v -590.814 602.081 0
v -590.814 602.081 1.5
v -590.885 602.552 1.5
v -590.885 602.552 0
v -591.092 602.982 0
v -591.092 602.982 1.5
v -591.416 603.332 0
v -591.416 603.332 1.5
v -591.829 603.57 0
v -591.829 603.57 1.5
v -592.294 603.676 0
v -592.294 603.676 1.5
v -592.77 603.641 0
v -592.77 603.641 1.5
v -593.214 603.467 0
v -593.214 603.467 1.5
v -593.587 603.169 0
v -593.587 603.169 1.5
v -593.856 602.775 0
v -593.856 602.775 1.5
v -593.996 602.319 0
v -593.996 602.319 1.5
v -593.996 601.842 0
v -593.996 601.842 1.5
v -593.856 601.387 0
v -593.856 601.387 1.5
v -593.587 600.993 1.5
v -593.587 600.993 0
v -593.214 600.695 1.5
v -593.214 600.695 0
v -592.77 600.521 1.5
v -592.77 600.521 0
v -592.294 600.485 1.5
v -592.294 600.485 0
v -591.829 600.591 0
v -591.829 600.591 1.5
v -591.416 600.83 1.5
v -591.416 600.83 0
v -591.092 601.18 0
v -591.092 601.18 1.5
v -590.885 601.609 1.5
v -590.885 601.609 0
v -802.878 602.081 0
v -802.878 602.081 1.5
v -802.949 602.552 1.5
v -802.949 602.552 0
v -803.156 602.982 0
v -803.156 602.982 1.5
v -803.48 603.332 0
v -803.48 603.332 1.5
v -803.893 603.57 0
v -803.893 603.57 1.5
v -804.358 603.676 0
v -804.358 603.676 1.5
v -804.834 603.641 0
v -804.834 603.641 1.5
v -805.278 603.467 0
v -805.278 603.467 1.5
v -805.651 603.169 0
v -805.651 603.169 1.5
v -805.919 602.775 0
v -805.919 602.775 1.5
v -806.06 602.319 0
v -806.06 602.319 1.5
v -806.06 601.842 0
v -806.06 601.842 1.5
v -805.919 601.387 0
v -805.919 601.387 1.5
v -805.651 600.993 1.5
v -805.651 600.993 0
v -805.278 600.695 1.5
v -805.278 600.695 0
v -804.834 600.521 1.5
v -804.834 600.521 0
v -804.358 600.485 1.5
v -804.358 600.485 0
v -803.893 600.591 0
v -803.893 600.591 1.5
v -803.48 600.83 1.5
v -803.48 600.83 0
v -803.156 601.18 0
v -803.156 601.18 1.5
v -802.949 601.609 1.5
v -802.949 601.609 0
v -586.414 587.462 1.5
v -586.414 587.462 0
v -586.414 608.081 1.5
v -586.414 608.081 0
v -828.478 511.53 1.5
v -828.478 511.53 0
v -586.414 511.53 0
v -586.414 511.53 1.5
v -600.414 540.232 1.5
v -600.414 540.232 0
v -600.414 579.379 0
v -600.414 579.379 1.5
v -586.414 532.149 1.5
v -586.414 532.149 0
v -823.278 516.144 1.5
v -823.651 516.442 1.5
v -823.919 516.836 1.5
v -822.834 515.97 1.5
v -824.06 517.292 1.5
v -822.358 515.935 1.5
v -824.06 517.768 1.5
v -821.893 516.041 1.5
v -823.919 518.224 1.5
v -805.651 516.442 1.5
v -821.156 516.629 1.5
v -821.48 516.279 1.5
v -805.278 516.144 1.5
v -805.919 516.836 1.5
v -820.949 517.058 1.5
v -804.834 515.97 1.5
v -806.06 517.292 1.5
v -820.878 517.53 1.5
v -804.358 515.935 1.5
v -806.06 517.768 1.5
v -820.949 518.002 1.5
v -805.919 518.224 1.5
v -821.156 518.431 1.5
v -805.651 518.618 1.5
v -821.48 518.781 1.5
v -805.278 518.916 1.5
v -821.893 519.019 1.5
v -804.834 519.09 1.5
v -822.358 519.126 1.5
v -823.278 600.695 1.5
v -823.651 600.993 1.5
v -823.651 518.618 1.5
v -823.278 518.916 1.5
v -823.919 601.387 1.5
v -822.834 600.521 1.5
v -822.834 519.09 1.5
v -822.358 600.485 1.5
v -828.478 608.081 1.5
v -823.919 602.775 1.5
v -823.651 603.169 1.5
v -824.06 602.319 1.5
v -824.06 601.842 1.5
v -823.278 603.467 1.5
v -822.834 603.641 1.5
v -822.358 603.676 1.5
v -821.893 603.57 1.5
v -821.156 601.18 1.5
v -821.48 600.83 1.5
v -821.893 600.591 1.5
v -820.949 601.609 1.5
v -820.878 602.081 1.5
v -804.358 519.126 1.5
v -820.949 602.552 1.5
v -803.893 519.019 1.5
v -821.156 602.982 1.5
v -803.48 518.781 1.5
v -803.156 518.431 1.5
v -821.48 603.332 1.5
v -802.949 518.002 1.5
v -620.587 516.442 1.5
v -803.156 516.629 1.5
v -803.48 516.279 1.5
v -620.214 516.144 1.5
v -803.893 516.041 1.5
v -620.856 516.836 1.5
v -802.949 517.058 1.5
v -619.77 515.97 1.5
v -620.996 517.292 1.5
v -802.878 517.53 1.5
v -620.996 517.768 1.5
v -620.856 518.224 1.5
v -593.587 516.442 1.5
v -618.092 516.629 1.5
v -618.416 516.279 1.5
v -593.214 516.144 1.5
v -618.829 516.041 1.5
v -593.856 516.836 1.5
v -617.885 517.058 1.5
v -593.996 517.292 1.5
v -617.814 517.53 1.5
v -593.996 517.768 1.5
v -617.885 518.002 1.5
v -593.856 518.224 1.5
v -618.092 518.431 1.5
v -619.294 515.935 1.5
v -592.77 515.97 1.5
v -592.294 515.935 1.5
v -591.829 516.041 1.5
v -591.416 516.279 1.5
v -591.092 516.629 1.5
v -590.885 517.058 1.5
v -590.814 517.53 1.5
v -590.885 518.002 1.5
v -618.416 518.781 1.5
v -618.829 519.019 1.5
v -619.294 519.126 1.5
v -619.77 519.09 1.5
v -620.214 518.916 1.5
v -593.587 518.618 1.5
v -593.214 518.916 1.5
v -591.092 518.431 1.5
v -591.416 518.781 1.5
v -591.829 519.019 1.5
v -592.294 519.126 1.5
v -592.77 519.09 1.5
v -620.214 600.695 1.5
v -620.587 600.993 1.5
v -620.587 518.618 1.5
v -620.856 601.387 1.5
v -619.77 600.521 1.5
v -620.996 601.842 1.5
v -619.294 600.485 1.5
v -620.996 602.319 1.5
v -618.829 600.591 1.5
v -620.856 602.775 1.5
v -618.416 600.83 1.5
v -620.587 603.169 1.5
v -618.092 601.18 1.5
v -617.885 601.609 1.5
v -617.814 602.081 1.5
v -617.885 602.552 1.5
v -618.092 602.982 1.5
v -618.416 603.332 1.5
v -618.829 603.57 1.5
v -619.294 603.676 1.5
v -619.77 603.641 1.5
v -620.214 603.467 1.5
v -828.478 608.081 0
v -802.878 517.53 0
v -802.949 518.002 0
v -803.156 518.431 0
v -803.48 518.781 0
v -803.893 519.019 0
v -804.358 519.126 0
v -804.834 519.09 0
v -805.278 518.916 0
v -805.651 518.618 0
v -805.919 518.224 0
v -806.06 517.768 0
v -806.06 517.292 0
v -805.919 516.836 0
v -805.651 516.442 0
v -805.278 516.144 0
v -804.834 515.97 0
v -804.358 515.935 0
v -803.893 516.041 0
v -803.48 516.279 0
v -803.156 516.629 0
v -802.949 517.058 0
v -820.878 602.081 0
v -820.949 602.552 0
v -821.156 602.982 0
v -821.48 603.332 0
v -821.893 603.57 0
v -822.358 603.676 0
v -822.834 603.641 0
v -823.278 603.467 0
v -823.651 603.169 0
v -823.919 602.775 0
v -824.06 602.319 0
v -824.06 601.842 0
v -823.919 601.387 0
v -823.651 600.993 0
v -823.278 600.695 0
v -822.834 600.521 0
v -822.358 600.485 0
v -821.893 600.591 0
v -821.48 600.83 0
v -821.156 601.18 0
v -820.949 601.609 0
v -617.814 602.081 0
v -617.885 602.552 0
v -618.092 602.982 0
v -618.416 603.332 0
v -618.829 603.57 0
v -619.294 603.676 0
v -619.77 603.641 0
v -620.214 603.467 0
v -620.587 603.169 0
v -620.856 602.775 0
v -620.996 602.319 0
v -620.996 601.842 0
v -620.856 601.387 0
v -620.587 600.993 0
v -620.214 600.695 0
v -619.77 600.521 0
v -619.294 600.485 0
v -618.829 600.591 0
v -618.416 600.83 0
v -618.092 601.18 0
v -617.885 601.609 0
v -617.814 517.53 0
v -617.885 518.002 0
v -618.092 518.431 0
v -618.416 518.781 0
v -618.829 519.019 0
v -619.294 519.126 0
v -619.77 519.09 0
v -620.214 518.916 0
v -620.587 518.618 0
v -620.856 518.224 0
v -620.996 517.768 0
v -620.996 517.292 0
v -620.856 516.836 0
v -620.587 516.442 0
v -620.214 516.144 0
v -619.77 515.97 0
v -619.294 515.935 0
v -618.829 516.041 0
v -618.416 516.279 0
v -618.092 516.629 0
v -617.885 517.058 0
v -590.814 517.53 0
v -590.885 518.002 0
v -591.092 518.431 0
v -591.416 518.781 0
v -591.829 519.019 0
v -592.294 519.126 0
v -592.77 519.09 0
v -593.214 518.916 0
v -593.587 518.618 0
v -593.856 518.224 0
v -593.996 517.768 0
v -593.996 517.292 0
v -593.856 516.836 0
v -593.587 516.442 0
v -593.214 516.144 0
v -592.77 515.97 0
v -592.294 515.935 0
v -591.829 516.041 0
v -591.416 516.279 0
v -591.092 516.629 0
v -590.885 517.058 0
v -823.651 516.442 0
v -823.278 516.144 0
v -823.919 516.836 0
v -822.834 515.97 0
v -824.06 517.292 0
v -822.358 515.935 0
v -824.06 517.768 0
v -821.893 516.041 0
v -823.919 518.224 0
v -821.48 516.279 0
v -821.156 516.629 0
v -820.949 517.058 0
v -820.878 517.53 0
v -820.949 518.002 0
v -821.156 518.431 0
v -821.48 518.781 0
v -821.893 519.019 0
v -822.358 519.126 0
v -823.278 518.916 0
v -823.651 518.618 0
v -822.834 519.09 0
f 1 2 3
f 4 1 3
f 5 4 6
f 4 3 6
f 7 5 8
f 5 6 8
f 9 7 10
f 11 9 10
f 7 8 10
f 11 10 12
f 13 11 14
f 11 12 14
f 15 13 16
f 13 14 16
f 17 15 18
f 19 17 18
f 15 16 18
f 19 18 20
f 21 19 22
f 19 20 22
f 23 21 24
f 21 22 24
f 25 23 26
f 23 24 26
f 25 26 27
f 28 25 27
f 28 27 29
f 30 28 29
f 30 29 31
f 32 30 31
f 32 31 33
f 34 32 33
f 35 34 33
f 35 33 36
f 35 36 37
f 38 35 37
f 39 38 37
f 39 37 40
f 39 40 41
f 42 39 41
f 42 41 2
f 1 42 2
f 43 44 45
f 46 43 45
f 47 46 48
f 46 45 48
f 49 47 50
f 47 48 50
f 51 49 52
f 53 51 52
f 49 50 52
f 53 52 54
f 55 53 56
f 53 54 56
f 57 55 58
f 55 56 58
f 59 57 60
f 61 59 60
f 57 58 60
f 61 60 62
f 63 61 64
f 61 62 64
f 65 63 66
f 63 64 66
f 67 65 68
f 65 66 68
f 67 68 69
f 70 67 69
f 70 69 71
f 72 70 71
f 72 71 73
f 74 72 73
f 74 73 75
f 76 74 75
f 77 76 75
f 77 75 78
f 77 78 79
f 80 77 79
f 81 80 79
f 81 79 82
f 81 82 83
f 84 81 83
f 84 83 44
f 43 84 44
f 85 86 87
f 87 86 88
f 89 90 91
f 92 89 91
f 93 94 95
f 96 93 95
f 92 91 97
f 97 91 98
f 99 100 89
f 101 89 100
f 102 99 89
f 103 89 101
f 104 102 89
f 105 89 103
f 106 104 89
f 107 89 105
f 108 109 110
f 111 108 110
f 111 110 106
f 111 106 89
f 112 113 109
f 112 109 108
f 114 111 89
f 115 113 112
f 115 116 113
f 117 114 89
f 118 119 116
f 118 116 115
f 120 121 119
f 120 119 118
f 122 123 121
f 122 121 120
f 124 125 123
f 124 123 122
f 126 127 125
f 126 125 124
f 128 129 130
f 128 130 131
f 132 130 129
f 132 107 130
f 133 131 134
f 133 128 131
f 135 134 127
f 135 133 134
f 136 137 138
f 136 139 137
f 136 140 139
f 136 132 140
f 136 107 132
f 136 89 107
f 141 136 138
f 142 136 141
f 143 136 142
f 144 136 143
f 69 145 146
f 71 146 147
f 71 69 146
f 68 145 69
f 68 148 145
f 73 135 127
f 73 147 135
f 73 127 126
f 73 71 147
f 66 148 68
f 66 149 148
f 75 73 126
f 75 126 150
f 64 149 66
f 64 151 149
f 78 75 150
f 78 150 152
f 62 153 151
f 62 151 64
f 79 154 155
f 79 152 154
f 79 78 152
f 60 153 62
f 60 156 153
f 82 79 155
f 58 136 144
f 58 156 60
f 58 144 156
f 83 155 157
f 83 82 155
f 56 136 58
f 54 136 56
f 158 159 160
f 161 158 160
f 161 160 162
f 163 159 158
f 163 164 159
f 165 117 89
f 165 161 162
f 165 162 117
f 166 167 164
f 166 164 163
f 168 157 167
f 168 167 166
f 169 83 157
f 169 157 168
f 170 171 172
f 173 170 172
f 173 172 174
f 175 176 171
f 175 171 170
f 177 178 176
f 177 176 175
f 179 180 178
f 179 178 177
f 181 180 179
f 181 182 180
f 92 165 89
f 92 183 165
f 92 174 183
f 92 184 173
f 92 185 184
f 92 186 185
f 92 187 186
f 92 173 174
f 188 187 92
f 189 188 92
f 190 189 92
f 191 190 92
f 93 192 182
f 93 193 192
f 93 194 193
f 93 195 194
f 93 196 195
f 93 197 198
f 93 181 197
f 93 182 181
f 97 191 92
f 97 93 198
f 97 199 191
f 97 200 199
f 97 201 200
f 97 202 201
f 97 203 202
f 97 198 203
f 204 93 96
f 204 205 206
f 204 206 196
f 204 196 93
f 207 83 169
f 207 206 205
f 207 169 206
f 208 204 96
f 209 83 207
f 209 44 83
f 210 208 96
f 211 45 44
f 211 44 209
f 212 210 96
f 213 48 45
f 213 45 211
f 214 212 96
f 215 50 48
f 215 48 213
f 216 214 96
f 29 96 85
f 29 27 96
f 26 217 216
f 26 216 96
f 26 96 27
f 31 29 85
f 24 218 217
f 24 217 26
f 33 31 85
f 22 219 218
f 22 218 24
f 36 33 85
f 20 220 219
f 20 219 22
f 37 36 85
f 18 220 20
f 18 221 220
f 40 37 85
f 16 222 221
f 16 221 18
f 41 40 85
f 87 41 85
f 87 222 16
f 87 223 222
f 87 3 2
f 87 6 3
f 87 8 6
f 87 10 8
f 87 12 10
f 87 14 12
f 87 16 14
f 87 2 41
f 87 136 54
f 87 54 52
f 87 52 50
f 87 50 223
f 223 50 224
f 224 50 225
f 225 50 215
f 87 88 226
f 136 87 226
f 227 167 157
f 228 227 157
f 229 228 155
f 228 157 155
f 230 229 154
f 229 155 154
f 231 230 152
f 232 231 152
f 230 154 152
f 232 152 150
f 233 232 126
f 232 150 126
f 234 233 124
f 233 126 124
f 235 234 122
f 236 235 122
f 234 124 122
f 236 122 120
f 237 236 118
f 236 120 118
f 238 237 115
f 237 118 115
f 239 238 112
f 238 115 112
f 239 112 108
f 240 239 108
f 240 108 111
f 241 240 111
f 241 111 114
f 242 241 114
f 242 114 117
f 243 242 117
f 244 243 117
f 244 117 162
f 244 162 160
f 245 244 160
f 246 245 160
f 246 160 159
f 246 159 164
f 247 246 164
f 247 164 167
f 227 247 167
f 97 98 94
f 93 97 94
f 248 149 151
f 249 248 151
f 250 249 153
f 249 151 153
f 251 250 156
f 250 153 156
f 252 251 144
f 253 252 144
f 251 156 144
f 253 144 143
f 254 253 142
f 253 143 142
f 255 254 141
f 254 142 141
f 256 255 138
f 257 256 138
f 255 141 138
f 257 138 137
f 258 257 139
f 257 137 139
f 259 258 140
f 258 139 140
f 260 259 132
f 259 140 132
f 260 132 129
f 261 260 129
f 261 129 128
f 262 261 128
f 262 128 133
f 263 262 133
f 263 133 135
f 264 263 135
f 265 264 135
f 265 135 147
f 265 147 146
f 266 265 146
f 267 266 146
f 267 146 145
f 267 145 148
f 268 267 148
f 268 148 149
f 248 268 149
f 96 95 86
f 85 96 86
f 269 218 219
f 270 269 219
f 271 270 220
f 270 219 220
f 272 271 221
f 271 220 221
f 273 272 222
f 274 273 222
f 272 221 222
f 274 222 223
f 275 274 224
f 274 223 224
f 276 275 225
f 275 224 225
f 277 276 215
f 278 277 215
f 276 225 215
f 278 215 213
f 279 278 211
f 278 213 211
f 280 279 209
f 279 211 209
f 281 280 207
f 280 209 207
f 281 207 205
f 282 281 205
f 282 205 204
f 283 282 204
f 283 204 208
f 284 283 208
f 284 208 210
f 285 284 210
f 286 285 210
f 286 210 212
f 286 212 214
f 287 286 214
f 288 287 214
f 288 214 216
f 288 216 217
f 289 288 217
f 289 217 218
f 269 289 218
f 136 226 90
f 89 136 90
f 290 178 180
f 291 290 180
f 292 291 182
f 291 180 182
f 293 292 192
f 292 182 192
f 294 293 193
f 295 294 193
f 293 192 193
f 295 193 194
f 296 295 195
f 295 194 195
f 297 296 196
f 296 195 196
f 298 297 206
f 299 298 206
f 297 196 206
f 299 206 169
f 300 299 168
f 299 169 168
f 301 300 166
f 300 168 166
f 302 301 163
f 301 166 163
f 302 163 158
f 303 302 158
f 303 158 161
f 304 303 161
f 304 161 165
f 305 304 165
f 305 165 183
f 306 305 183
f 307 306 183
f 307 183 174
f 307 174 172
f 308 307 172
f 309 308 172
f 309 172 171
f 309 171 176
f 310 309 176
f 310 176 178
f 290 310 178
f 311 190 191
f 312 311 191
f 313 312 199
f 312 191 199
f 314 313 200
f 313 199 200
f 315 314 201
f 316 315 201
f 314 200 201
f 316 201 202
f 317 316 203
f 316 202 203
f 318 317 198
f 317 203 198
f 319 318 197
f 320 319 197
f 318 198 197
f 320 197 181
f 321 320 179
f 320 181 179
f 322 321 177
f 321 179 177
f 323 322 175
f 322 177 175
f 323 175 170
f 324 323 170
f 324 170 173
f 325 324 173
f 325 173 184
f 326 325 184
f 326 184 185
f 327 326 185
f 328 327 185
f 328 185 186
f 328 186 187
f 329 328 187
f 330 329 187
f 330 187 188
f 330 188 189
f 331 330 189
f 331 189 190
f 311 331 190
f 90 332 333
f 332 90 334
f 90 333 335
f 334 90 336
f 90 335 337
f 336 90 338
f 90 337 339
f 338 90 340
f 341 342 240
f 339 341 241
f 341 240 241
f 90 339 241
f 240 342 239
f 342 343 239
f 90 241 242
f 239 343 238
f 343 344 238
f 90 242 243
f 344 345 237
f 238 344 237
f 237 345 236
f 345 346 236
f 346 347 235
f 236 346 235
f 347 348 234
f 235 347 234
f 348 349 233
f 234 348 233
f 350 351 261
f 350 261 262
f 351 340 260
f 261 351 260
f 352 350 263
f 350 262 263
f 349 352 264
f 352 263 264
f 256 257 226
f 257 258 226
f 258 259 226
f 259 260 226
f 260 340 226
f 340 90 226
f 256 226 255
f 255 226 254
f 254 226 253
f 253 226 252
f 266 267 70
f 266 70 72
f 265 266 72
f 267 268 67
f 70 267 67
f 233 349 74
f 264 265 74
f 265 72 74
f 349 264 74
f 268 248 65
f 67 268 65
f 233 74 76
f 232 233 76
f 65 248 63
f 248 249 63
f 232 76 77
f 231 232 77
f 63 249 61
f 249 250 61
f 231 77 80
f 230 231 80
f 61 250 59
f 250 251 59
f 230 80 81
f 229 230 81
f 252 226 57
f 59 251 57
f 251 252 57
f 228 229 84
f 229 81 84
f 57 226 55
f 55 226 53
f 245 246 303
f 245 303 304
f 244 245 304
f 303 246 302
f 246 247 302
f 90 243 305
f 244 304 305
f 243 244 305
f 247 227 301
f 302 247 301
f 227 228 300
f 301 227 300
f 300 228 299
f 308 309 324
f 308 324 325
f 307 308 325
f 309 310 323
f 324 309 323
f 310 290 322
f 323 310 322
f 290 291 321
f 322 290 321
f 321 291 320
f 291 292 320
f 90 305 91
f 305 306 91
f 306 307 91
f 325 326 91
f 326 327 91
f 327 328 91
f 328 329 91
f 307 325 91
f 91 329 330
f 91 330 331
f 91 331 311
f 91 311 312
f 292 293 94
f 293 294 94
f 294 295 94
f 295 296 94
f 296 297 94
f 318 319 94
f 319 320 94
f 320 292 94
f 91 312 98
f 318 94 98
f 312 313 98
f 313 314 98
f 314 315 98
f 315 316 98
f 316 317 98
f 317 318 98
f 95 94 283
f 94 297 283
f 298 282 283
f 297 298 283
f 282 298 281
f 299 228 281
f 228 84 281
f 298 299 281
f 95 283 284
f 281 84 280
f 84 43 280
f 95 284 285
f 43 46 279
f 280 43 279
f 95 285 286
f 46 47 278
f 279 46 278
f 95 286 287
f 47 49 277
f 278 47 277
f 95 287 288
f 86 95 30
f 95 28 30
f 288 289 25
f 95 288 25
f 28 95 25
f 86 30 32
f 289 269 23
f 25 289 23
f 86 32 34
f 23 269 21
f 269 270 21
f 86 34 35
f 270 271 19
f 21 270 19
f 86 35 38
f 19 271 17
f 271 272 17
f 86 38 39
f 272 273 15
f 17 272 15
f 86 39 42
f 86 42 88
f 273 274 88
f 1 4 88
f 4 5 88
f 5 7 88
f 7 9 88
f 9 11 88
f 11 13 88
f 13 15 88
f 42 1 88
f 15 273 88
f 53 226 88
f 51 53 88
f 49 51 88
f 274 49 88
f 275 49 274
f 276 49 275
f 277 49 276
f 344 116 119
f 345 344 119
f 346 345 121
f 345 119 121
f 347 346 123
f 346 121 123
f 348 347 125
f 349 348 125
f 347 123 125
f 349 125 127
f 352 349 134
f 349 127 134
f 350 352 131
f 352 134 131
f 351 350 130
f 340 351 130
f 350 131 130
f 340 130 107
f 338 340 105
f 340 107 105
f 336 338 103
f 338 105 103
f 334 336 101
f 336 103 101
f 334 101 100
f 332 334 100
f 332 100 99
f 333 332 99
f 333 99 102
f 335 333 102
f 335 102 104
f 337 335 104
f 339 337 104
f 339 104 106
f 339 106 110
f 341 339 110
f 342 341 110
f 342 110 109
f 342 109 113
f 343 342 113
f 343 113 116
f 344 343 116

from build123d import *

# Parameters (mm, degrees)
BOSS_EXTRUDE1_DEPTH = 1.5
SKETCH2_R           = 1.6
CUT_EXTRUDE1_DEPTH  = 3.5


with BuildPart() as part:
    # Sketch1 → Boss-Extrude1 (new body)
    with BuildSketch(Plane.XY):
        Polygon((-586.414001465, 608.080871166), (-828.47776474, 608.080871166), (-828.47776474, 511.530029297), (-586.414001465, 511.530029297), (-586.414001465, 532.14883145), (-600.414001465, 540.231735219), (-600.414001465, 579.379165244), (-586.414001465, 587.462069012), align=None)
    extrude(amount=BOSS_EXTRUDE1_DEPTH)

    # Sketch2 → Cut-Extrude1 (cut)
    with BuildSketch(Plane.XY.offset(1.5)):
        with Locations((-822.47776474, 602.080871166)):
            Circle(SKETCH2_R)
        with Locations((-804.47776474, 602.080871166)):
            Circle(SKETCH2_R)
        with Locations((-822.47776474, 517.530029297)):
            Circle(SKETCH2_R)
        with Locations((-804.47776474, 517.530029297)):
            Circle(SKETCH2_R)
        with Locations((-619.414001465, 602.080871166)):
            Circle(SKETCH2_R)
        with Locations((-592.414001465, 602.080871166)):
            Circle(SKETCH2_R)
        with Locations((-619.414001465, 517.530029297)):
            Circle(SKETCH2_R)
        with Locations((-592.414001465, 517.530029297)):
            Circle(SKETCH2_R)
    extrude(amount=-CUT_EXTRUDE1_DEPTH, mode=Mode.SUBTRACT)


solid = part.part
